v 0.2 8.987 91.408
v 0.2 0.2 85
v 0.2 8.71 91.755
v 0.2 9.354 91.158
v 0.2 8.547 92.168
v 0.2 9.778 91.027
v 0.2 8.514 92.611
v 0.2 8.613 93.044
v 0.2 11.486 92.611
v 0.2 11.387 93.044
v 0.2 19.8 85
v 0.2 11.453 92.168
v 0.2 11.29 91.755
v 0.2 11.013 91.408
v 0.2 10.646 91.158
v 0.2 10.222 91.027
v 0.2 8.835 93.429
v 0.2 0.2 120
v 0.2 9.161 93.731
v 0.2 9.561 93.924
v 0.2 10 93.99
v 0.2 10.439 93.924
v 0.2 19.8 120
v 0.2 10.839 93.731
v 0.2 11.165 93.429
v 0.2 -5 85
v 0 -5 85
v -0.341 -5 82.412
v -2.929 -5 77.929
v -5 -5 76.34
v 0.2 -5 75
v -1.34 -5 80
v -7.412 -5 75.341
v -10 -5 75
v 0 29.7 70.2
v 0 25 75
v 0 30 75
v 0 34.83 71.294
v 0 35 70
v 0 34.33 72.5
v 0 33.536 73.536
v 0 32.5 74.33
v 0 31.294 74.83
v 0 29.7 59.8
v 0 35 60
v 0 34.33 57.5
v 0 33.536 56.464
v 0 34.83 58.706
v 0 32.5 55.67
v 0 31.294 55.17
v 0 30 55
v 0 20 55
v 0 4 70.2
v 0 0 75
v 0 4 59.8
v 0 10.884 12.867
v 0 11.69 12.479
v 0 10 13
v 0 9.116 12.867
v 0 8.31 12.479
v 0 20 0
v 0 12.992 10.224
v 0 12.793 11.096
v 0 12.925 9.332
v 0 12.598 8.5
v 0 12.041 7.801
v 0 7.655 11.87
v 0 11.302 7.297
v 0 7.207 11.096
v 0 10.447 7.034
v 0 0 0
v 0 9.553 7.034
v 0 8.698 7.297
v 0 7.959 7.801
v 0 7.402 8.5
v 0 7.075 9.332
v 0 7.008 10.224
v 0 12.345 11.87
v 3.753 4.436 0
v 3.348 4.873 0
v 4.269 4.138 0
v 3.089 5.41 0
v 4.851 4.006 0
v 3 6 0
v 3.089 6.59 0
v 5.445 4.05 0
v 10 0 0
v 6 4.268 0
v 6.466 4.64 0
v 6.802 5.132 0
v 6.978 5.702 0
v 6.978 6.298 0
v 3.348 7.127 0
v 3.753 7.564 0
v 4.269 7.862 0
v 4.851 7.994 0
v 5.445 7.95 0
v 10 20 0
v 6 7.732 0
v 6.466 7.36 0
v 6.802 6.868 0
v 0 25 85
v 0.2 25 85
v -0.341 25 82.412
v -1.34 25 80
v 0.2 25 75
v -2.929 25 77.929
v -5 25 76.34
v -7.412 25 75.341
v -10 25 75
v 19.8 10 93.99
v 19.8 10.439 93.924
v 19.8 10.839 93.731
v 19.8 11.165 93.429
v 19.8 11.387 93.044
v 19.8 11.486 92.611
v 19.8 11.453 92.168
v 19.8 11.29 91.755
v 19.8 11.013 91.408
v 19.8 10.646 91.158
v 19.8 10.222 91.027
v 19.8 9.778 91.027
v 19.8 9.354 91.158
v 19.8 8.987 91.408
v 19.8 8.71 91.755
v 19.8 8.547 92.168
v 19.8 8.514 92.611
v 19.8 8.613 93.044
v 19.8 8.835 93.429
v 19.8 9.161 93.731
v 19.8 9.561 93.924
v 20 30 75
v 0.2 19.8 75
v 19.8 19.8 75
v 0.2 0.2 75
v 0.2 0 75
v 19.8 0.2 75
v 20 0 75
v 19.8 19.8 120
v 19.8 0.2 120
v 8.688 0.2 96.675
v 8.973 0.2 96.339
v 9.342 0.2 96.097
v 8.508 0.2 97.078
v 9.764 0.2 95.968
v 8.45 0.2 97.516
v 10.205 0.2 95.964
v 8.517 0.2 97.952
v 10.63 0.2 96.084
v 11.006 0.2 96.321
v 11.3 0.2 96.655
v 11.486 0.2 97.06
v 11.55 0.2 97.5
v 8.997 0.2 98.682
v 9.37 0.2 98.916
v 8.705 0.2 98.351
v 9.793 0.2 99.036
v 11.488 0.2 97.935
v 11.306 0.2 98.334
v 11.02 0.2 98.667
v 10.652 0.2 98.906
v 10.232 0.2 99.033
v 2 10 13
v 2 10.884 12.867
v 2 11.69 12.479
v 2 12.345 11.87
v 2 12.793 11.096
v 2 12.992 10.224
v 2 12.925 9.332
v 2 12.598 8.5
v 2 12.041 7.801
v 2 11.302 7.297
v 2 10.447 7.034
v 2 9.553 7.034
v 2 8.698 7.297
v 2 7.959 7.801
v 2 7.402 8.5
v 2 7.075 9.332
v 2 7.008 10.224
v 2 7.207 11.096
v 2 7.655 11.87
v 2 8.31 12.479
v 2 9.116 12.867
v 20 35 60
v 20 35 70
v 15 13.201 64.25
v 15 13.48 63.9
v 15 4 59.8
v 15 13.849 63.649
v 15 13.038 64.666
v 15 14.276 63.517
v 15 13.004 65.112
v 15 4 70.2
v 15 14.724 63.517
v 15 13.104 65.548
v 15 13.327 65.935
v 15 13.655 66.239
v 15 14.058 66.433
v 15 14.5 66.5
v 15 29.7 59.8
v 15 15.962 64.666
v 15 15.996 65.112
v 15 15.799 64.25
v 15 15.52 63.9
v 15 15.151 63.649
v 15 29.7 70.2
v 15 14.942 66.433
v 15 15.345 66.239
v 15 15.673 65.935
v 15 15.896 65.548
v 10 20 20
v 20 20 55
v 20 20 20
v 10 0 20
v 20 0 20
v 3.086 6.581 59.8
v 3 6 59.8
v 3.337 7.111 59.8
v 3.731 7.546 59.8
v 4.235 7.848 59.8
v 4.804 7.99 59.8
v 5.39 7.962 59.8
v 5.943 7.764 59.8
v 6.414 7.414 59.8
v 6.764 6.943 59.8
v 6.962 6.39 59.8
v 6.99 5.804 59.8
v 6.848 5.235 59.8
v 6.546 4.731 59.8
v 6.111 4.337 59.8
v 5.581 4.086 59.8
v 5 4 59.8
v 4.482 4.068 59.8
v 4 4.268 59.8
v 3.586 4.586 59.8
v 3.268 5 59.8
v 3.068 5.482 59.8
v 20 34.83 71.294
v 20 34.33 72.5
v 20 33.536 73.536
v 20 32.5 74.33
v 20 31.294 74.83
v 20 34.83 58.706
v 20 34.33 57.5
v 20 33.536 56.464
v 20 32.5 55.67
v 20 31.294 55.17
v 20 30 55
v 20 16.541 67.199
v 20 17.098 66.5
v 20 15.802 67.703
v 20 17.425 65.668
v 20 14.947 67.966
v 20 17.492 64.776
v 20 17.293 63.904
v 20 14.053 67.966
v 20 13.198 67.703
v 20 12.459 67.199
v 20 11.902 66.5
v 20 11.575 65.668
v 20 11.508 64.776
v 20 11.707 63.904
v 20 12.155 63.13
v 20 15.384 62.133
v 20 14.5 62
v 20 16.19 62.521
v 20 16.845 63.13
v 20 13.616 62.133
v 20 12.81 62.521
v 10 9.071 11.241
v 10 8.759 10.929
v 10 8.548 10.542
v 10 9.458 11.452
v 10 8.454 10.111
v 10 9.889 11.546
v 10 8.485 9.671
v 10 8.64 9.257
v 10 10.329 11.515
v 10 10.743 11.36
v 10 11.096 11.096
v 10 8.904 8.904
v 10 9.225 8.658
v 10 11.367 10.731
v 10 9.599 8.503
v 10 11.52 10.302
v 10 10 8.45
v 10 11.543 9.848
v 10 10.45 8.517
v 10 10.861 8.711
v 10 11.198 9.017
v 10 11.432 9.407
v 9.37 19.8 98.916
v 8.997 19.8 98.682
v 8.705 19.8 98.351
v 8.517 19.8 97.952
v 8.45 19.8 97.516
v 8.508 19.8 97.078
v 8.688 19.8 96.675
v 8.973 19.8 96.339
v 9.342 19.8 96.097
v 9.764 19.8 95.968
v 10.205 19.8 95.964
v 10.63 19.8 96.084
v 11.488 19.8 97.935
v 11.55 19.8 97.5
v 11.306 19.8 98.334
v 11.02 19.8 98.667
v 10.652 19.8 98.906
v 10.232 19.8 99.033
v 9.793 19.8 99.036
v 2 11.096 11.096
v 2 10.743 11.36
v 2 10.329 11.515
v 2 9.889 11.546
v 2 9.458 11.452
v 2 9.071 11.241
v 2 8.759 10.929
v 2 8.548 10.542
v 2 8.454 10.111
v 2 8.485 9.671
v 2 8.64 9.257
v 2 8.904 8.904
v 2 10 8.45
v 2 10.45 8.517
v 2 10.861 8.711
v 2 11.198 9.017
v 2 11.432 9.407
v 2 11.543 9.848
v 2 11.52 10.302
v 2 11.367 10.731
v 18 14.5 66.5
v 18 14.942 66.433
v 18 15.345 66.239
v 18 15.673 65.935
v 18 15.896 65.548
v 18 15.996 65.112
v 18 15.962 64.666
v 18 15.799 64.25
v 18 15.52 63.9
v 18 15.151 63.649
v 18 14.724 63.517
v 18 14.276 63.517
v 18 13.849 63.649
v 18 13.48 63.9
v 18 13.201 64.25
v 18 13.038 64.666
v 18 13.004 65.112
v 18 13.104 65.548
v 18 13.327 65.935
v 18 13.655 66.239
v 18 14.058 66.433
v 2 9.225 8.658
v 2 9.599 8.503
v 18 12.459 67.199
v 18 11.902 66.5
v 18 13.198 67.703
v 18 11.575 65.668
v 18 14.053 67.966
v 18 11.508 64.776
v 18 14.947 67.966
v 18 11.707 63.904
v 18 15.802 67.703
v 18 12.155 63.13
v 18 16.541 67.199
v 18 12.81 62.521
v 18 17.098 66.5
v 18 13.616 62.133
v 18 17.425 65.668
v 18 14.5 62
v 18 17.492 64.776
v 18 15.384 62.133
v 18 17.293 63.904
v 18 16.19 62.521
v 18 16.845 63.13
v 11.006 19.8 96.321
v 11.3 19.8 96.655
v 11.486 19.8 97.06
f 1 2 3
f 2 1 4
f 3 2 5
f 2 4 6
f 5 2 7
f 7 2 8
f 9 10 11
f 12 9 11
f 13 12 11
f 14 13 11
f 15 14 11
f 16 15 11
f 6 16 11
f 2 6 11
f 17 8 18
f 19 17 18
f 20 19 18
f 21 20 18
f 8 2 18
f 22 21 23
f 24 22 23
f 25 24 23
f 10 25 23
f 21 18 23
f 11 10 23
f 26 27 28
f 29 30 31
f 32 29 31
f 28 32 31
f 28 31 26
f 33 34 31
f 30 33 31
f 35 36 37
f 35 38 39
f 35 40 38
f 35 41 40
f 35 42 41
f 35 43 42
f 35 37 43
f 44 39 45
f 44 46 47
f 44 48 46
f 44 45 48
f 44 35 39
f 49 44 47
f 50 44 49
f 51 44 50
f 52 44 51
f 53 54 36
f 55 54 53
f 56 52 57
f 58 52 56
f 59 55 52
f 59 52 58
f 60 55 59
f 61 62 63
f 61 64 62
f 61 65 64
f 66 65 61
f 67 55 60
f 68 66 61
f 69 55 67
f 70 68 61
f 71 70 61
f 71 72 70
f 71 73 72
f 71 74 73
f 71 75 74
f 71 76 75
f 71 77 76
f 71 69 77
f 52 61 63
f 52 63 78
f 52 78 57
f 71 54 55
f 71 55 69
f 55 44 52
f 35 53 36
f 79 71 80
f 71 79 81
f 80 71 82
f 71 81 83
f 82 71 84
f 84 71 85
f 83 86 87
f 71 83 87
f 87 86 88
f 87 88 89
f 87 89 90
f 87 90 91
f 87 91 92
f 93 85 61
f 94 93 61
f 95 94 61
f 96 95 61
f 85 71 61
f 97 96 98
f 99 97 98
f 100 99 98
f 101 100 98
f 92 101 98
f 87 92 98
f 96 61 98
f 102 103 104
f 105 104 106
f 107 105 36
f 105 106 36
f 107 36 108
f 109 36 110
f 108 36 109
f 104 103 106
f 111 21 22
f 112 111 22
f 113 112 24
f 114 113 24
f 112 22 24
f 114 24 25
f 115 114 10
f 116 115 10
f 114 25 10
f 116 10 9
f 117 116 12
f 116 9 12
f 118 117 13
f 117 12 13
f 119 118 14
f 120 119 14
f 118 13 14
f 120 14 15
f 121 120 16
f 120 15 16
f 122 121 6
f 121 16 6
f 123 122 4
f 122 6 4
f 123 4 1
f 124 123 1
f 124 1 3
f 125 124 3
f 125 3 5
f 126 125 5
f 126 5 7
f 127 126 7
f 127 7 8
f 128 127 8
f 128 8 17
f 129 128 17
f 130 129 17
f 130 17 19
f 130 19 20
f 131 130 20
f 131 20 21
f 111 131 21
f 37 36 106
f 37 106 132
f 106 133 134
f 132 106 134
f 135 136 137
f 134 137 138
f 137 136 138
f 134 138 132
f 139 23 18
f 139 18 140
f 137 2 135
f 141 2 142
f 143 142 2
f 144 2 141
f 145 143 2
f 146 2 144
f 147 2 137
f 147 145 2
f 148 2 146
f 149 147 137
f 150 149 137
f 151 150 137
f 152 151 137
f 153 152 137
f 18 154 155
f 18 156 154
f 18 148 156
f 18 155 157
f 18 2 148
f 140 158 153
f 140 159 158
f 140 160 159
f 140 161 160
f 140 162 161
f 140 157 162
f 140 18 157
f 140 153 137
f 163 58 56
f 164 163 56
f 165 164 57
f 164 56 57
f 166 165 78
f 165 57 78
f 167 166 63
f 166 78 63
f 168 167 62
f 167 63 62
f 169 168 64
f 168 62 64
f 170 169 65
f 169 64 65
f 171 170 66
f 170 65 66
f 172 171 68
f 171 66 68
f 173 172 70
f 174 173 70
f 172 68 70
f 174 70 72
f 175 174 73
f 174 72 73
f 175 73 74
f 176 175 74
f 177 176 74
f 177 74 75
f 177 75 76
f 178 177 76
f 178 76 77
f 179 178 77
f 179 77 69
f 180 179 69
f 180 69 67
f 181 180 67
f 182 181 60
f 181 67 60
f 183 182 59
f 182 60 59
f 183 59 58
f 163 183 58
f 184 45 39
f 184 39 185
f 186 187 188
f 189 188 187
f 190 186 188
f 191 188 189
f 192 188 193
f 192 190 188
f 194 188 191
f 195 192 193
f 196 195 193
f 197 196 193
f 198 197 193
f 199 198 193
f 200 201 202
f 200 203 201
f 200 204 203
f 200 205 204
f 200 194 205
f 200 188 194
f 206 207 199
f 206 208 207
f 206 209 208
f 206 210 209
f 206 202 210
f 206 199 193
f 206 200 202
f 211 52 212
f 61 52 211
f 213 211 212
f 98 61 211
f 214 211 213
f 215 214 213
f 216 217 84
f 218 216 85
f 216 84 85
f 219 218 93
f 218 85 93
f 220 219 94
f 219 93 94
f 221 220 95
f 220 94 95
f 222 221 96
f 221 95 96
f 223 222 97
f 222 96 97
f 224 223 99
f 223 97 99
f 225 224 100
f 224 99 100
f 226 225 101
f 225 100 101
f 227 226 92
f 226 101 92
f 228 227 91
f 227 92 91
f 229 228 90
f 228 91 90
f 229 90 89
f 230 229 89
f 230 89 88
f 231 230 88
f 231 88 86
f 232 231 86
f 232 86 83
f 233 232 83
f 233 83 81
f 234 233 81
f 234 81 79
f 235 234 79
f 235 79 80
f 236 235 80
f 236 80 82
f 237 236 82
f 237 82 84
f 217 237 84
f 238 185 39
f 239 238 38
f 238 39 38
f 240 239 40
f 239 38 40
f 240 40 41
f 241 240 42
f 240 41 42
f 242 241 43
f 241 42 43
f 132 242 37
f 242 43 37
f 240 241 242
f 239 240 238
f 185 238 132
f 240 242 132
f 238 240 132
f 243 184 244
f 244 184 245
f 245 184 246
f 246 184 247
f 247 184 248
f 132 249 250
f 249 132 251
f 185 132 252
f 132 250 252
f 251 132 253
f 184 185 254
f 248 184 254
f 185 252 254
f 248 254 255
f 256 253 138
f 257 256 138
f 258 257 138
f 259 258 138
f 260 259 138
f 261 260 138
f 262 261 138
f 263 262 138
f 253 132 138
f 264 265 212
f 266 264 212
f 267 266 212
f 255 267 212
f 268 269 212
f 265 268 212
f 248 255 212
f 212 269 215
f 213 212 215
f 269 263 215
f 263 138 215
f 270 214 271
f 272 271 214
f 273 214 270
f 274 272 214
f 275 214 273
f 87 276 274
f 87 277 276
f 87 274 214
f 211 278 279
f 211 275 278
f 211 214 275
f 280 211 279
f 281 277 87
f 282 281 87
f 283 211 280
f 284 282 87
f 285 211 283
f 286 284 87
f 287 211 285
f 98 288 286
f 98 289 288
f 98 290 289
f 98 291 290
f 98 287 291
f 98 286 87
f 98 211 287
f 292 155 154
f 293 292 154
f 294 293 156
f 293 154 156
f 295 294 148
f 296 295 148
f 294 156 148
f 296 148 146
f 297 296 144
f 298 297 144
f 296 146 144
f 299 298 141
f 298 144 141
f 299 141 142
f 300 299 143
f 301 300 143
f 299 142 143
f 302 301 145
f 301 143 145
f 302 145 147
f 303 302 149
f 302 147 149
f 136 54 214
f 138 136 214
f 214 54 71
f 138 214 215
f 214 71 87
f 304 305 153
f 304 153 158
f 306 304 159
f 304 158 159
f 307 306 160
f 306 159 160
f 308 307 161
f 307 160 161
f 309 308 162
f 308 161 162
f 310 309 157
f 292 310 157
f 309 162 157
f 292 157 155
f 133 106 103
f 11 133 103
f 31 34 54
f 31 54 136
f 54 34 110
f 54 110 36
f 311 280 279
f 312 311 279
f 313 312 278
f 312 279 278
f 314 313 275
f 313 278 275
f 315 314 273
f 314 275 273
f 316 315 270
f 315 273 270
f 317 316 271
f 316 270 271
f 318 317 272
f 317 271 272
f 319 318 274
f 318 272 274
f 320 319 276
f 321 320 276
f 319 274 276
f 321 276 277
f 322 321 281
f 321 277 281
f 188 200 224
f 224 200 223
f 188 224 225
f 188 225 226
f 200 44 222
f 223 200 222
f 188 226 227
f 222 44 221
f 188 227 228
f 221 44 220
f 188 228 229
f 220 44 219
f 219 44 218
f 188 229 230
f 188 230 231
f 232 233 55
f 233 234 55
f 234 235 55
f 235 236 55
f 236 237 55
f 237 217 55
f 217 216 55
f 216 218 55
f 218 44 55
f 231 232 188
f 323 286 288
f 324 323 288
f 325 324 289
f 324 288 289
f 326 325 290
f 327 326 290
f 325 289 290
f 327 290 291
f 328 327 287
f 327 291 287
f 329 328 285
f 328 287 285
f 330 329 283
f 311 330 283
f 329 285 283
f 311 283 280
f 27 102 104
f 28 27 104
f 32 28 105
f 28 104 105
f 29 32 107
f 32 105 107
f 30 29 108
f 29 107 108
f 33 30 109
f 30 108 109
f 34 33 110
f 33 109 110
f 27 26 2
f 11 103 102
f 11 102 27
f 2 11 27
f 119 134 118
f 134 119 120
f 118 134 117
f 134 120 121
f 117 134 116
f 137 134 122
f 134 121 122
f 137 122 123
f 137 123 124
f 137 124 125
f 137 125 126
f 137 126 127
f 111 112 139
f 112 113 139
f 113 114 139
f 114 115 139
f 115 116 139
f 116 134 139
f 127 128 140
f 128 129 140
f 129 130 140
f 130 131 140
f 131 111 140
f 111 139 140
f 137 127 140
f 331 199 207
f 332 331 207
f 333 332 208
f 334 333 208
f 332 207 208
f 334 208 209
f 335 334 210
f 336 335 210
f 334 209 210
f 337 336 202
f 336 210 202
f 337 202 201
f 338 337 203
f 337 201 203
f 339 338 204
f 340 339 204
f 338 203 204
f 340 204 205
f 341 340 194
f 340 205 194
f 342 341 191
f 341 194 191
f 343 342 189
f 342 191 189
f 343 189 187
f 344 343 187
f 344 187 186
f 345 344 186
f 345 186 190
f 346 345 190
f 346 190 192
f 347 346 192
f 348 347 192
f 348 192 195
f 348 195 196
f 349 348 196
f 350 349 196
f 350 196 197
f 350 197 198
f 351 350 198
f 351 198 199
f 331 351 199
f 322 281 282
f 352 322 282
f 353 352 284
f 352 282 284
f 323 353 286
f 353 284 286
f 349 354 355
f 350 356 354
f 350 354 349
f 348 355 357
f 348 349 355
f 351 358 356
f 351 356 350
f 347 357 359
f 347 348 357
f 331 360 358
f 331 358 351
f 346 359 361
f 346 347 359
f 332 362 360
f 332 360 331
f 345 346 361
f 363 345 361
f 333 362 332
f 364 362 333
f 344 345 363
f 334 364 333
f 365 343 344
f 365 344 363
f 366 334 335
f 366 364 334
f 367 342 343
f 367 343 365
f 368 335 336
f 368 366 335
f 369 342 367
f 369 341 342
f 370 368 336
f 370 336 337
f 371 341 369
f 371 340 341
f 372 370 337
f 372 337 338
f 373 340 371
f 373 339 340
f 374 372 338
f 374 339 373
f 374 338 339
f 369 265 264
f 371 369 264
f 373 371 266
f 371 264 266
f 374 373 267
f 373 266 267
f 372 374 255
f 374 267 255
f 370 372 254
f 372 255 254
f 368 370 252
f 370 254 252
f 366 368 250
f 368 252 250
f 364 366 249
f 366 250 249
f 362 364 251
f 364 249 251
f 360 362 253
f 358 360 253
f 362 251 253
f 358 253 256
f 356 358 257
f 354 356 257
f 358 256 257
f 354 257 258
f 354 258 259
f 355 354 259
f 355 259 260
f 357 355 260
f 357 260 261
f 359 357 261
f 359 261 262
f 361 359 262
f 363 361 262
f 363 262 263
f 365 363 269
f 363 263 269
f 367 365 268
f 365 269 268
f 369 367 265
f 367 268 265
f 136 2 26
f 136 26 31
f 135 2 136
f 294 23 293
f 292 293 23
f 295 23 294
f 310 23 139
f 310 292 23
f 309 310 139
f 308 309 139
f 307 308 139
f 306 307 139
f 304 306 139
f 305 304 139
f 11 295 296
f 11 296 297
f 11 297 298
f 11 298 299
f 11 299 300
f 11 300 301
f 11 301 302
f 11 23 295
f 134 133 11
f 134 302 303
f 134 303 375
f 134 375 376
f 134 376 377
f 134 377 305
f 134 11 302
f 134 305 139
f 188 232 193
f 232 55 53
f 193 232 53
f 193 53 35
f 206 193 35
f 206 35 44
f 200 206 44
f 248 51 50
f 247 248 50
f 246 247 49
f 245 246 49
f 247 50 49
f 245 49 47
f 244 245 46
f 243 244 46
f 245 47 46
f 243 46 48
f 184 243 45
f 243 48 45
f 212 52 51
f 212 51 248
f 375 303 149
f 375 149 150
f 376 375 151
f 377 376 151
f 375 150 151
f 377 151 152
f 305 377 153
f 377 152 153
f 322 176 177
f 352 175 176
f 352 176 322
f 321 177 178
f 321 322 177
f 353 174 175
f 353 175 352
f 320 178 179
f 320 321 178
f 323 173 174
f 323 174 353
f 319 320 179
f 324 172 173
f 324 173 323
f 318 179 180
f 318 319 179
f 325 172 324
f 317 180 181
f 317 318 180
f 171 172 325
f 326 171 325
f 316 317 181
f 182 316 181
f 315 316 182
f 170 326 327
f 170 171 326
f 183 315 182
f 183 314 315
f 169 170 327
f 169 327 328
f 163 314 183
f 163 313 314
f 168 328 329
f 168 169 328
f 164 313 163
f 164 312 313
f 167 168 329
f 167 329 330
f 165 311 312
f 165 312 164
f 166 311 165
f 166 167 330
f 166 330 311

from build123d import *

# Parameters (mm, degrees)
SKETCH_1_W           = 20
SKETCH_1_H           = 20
EXTRUDE_1_DEPTH      = 120
SKETCH_2_W           = 10
SKETCH_2_H           = 20
CUT_EXTRUDE_1_DEPTH  = 120
CUT_EXTRUDE_2_DEPTH  = 120
SKETCH_4_R           = 3
CUT_EXTRUDE_3_DEPTH  = 2
SKETCH_6_R           = 1.49
CUT_EXTRUDE_4_DEPTH  = 20
CUT_EXTRUDE_5_DEPTH  = 20
SKETCH_8_W           = 19.6
SKETCH_8_H           = 0.2
SKETCH_8_W_2         = 0.2
SKETCH_8_H_2         = 19.6
CUT_EXTRUDE_6_DEPTH  = 45
EXTRUDE_2_DEPTH      = 24.8
EXTRUDE_START        = 5.2
EXTRUDE_3_DEPTH      = 5.2
SKETCH_12_W          = 20
SKETCH_12_H          = 20
EXTRUDE_4_DEPTH      = 15
CUT_EXTRUDE_7_DEPTH  = 15
SKETCH_14_R          = 2
CUT_EXTRUDE_8_DEPTH  = 70
SKETCH_15_R          = 1.5
CUT_EXTRUDE_9_DEPTH  = 5
SKETCH_16_R          = 3
CUT_EXTRUDE_10_DEPTH = 2
CUT_EXTRUDE_11_DEPTH = 20
SKETCH_18_W          = 0.2
SKETCH_18_H          = 25.5
CUT_EXTRUDE_12_DEPTH = 15


with BuildPart() as part:
    # 草图1 → 凸台-拉伸1 (new body)
    with BuildSketch(Plane.XY):
        with Locations((10, 10)):
            Rectangle(SKETCH_1_W, SKETCH_1_H)
    extrude(amount=EXTRUDE_1_DEPTH)

    # 草图2 → 切除-拉伸1 (cut)
    with BuildSketch(Plane(origin=(0, 20, 0), x_dir=(1, 0, 0), z_dir=(0, 1, 0))):
        with Locations((15, -10)):
            Rectangle(SKETCH_2_W, SKETCH_2_H)
    extrude(amount=-CUT_EXTRUDE_1_DEPTH, mode=Mode.SUBTRACT)

    # 草图3 → 切除-拉伸2 (cut)
    with BuildSketch(Plane(origin=(10, 0, 0), x_dir=(0, 0, -1), z_dir=(1, 0, 0))):
        with BuildLine():
            ThreePointArc((-8.45, 10), (-9.40684068, 11.432013275), (-11.096015511, 11.096015511))
            Line((-11.096015511, 11.096015511), (-8.903984489, 8.903984489))
            ThreePointArc((-8.903984489, 8.903984489), (-8.567986725, 9.40684068), (-8.45, 10))
        make_face()
        with BuildLine():
            Line((-8.903984489, 8.903984489), (-11.096015511, 11.096015511))
            ThreePointArc((-11.096015511, 11.096015511), (-11.096015511, 8.903984489), (-8.903984489, 8.903984489))
        make_face()
    extrude(amount=-CUT_EXTRUDE_2_DEPTH, mode=Mode.SUBTRACT)

    # 草图4 → 切除-拉伸3 (cut)
    with BuildSketch(Plane.ZY):
        with Locations((10, 10)):
            Circle(SKETCH_4_R)
    extrude(amount=-CUT_EXTRUDE_3_DEPTH, mode=Mode.SUBTRACT)

    # 草图6 → 切除-拉伸4 (cut)
    with BuildSketch(Plane.ZY):
        with Locations((92.5, 10)):
            Circle(SKETCH_6_R)
    extrude(amount=-CUT_EXTRUDE_4_DEPTH, mode=Mode.SUBTRACT)

    # 草图7 → 切除-拉伸5 (cut)
    with BuildSketch(Plane.XZ):
        with BuildLine():
            ThreePointArc((11.55, 97.5), (10.844615988, 98.799662969), (9.370485378, 98.9164079))
            Line((9.370485378, 98.9164079), (10.629514622, 96.0835921))
            ThreePointArc((10.629514622, 96.0835921), (11.299662969, 96.655384012), (11.55, 97.5))
        make_face()
        with BuildLine():
            Line((10.629514622, 96.0835921), (9.370485378, 98.9164079))
            ThreePointArc((9.370485378, 98.9164079), (8.5835921, 96.870485378), (10.629514622, 96.0835921))
        make_face()
    extrude(amount=-CUT_EXTRUDE_5_DEPTH, mode=Mode.SUBTRACT)

    # 草图8 → 切除-拉伸6 (cut)
    with BuildSketch(Plane.XY.offset(120)):
        with Locations((10, 19.9)):
            Rectangle(SKETCH_8_W, SKETCH_8_H)
        with Locations((0.1, 19.9)):
            Rectangle(SKETCH_8_W_2, SKETCH_8_H)
        with Locations((0.1, 10)):
            Rectangle(SKETCH_8_W_2, SKETCH_8_H_2)
        with Locations((19.9, 10)):
            Rectangle(SKETCH_8_W_2, SKETCH_8_H_2)
        with Locations((19.9, 0.1)):
            Rectangle(SKETCH_8_W_2, SKETCH_8_H)
        with Locations((10, 0.1)):
            Rectangle(SKETCH_8_W, SKETCH_8_H)
        with Locations((0.1, 0.1)):
            Rectangle(SKETCH_8_W_2, SKETCH_8_H)
        with Locations((19.9, 19.9)):
            Rectangle(SKETCH_8_W_2, SKETCH_8_H)
    extrude(amount=-CUT_EXTRUDE_6_DEPTH, mode=Mode.SUBTRACT)

    # 草图9 → 凸台-拉伸2 (add)
    with BuildSketch(Plane(origin=(0, 19.8, 0), x_dir=(1, 0, 0), z_dir=(0, 1, 0))):
        with BuildLine():
            Line((0, -75), (-10, -75))
            ThreePointArc((-10, -75), (-2.928932188, -77.928932188), (0, -85))
            Line((0, -85), (0.2, -85))
            Line((0.2, -85), (0.2, -75))
            Line((0.2, -75), (0, -75))
        make_face()
    extrude(amount=-EXTRUDE_2_DEPTH)

    # 草图10 → 凸台-拉伸3 (add)
    with BuildSketch(Plane(origin=(0, 19.8, 0), x_dir=(1, 0, 0), z_dir=(0, 1, 0)).offset(EXTRUDE_START)):
        with BuildLine():
            Line((-10, -75), (0, -75))
            Line((0, -75), (0.2, -75))
            Line((0.2, -75), (0.2, -85))
            Line((0.2, -85), (0, -85))
            ThreePointArc((0, -85), (-2.928932188, -77.928932188), (-10, -75))
        make_face()
    extrude(amount=-EXTRUDE_3_DEPTH)

    # 草图12 → 凸台-拉伸4 (add)
    with BuildSketch(Plane(origin=(0, 20, 0), x_dir=(1, 0, 0), z_dir=(0, 1, 0))):
        with Locations((10, -65)):
            Rectangle(SKETCH_12_W, SKETCH_12_H)
    extrude(amount=EXTRUDE_4_DEPTH)

    # 草图13 → 切除-拉伸7 (cut)
    with BuildSketch(Plane.ZY):
        Polygon((65, 20), (60, 20), (60, 4), (70, 4), (70, 20), align=None)
        Polygon((60, 29.5), (60, 20), (65, 20), (65, 25), (65, 29.5), align=None)
        Polygon((65, 25), (65, 20), (70, 20), (70, 29.5), (65, 29.5), align=None)
    extrude(amount=-CUT_EXTRUDE_7_DEPTH, mode=Mode.SUBTRACT)

    # 草图14 → 切除-拉伸8 (cut)
    with BuildSketch(Plane(origin=(0, 0, 0), x_dir=(-1, 0, 0), z_dir=(0, 0, -1))):
        with Locations((-5, 6)):
            Circle(SKETCH_14_R)
    extrude(amount=-CUT_EXTRUDE_8_DEPTH, mode=Mode.SUBTRACT)

    # 草图15 → 切除-拉伸9 (cut)
    with BuildSketch(Plane.ZY.offset(-15)):
        with Locations((65, 14.5)):
            Circle(SKETCH_15_R)
    extrude(amount=-CUT_EXTRUDE_9_DEPTH, mode=Mode.SUBTRACT)

    # 草图16 → 切除-拉伸10 (cut)
    with BuildSketch(Plane(origin=(20, 0, 0), x_dir=(0, 0, -1), z_dir=(1, 0, 0))):
        with Locations((-65, 14.5)):
            Circle(SKETCH_16_R)
    extrude(amount=-CUT_EXTRUDE_10_DEPTH, mode=Mode.SUBTRACT)

    # 草图17 → 切除-拉伸11 (cut)
    with BuildSketch(Plane.ZY):
        with BuildLine():
            Line((60, 35), (55, 35))
            Line((55, 35), (55, 30))
            ThreePointArc((55, 30), (56.464466094, 33.535533906), (60, 35))
        make_face()
        with BuildLine():
            Line((75, 35), (70, 35))
            ThreePointArc((70, 35), (73.535533906, 33.535533906), (75, 30))
            Line((75, 30), (75, 35))
        make_face()
    extrude(amount=-CUT_EXTRUDE_11_DEPTH, mode=Mode.SUBTRACT)

    # 草图18 → 切除-拉伸12 (cut)
    with BuildSketch(Plane.ZY):
        with Locations((59.9, 16.75)):
            Rectangle(SKETCH_18_W, SKETCH_18_H)
        Polygon((70, 29.5), (70.2, 29.5), (70.2, 29.7), (59.8, 29.7), (59.8, 29.5), (60, 29.5), align=None)
        with Locations((70.1, 16.75)):
            Rectangle(SKETCH_18_W, SKETCH_18_H)
    extrude(amount=-CUT_EXTRUDE_12_DEPTH, mode=Mode.SUBTRACT)


solid = part.part
